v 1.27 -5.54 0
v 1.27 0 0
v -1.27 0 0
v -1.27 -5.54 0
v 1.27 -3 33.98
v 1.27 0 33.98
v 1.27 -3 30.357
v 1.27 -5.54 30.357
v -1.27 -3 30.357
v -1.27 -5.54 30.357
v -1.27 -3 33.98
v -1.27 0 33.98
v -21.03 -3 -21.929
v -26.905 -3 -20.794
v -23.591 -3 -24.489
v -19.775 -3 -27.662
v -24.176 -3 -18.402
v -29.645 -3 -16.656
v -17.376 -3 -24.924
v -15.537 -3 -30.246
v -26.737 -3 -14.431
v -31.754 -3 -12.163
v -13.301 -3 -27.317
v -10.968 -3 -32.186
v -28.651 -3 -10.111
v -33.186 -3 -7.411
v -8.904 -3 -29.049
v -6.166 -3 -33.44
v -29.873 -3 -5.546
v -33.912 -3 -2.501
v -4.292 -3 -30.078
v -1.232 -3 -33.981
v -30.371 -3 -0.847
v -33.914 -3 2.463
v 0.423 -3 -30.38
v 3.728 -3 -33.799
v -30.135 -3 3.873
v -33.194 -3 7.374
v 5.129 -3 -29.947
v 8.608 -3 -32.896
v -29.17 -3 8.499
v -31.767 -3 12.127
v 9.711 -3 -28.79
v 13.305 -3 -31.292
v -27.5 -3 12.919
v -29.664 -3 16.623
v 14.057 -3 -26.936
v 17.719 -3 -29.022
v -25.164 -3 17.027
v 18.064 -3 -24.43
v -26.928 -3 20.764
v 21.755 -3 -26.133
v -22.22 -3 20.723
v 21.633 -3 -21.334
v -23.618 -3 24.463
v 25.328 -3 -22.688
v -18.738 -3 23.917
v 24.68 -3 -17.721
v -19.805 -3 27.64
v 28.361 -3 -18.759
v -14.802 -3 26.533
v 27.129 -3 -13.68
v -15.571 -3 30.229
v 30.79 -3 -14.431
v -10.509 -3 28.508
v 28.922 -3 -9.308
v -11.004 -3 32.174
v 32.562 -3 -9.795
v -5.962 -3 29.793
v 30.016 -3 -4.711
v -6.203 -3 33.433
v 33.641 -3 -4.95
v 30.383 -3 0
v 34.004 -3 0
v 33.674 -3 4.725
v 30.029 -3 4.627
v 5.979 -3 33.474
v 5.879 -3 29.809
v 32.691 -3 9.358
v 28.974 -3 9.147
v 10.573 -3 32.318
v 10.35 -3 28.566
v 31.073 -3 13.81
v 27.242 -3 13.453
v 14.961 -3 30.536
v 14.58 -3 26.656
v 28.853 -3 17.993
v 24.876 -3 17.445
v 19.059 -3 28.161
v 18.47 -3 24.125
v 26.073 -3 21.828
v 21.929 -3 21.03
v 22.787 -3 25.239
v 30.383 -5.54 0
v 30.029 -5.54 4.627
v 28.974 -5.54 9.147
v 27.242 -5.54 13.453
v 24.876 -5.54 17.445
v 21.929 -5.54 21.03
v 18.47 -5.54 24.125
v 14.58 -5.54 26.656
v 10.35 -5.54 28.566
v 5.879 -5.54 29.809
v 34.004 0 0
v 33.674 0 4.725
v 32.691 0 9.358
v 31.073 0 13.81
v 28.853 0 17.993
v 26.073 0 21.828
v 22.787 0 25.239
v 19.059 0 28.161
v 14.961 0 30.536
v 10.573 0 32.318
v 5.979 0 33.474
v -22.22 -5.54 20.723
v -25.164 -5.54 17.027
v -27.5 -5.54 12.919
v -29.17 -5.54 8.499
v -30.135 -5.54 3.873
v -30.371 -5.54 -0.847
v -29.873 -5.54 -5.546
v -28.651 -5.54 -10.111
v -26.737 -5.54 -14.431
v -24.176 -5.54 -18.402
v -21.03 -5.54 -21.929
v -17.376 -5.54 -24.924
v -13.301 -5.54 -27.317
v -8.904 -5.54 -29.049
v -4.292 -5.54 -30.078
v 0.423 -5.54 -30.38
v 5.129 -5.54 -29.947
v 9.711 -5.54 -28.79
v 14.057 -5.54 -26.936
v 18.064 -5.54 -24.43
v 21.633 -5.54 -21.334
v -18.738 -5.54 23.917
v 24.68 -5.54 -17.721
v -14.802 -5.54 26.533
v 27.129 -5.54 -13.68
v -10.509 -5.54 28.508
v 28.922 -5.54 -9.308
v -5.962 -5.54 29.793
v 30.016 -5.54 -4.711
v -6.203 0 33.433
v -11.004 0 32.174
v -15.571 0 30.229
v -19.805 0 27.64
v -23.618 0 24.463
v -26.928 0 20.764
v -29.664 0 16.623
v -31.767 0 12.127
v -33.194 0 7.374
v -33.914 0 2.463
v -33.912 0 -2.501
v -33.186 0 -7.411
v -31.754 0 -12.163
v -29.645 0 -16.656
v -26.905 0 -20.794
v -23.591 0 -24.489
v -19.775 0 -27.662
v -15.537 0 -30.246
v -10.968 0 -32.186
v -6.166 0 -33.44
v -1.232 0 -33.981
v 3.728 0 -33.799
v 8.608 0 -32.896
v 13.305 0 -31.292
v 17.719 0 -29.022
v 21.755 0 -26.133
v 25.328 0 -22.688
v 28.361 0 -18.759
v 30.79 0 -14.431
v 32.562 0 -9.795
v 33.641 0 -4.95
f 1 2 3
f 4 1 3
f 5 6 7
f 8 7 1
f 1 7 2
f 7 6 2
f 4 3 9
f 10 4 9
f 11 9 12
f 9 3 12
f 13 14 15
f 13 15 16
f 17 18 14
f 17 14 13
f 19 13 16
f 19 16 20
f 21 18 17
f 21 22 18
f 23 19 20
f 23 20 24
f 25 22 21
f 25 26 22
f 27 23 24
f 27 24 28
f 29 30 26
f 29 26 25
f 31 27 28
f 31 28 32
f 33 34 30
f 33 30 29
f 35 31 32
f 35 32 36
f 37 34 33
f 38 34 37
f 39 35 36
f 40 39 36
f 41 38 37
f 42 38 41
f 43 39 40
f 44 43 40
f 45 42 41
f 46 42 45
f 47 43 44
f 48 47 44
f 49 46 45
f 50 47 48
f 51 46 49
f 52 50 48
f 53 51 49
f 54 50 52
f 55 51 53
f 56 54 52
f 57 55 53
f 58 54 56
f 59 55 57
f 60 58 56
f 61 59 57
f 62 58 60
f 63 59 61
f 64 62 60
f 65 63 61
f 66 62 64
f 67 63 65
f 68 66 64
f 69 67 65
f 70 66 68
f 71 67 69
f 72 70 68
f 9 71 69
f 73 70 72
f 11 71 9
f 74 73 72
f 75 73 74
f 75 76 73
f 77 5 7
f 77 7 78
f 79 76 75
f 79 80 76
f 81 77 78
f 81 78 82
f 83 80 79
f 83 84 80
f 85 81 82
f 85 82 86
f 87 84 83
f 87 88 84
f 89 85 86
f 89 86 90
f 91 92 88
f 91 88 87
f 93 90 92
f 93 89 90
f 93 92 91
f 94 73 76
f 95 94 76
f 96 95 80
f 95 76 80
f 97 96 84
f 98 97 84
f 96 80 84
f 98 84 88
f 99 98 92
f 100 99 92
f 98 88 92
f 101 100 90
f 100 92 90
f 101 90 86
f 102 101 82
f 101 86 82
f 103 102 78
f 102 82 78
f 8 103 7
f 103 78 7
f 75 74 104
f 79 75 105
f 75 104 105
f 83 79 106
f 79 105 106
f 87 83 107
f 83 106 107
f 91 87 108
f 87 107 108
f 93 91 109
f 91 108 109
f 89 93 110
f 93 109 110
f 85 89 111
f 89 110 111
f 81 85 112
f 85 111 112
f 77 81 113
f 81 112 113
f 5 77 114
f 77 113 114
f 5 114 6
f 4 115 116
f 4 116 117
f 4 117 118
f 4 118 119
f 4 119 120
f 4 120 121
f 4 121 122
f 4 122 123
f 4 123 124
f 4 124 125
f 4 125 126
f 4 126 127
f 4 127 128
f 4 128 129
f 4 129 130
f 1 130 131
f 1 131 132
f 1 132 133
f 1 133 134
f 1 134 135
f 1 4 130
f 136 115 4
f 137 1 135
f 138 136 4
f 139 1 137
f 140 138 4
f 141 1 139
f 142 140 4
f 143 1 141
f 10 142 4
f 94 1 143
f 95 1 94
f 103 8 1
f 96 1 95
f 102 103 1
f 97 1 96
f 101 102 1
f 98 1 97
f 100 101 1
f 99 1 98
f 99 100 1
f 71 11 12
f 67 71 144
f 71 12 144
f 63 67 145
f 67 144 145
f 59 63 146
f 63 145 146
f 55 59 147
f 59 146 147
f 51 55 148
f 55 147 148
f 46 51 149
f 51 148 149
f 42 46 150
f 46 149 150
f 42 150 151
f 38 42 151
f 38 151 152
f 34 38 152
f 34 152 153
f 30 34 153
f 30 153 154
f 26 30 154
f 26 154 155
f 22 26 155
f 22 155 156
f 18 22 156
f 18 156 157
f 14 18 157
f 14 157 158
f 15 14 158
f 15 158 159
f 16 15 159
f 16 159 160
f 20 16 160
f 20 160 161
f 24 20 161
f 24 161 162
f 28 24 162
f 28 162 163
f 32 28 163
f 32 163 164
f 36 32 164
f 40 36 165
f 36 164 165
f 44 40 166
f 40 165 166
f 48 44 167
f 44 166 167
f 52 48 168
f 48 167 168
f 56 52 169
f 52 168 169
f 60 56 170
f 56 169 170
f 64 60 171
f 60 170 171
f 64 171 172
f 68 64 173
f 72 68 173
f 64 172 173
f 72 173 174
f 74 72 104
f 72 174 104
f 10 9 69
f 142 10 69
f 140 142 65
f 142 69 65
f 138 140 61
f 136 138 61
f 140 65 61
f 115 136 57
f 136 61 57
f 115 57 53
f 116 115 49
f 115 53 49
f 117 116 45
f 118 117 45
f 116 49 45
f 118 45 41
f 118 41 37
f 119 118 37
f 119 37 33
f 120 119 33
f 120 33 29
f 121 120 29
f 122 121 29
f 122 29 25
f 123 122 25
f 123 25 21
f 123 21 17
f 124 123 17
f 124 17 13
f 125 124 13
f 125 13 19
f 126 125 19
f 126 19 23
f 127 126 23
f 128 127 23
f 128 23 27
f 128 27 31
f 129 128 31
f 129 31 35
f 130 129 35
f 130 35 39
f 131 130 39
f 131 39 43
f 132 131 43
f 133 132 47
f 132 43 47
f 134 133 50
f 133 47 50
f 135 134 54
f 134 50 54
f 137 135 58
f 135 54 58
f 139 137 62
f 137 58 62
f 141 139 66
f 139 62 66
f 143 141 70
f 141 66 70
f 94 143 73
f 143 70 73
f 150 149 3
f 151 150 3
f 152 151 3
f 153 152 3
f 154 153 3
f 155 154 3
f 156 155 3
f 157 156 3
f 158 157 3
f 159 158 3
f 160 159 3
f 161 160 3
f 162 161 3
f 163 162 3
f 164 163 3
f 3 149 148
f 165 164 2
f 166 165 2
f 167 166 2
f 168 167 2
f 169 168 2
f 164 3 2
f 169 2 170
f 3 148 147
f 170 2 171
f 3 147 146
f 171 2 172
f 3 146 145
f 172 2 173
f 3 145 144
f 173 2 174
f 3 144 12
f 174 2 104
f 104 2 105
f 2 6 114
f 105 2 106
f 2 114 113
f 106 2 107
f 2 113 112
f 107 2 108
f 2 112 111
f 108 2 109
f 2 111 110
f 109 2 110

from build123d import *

# Parameters (mm, degrees)
F0_R     = 34.003595
F1_DEPTH = 3
F2_R     = 30.383163
F3_DEPTH = 2.54
F5_DEPTH = 25.4


with BuildPart() as f1:
    # F0 (on Front) → F1 (new body)
    with BuildSketch(Plane.XZ):
        Circle(F0_R)
    extrude(amount=F1_DEPTH)

    # F2 (on face) → F3 (join)
    with BuildSketch(Plane.XZ.offset(3)):
        Circle(F2_R)
    extrude(amount=F3_DEPTH)

    # F4 (on face) → F5 (cut)
    with BuildSketch(Plane(origin=(0, 0, 0), x_dir=(-1, 0, 0), z_dir=(0, 1, 0))):
        with BuildLine():
            Line((-1.27, 0), (0, 0))
            Line((0, 0), (1.27, 0))
            Line((1.27, 0), (1.27, 33.97987))
            ThreePointArc((1.27, 33.97987), (0, 34.003595), (-1.27, 33.97987))
            Line((-1.27, 33.97987), (-1.27, 0))
        make_face()
    extrude(amount=-F5_DEPTH, mode=Mode.SUBTRACT)


solid = f1.part
